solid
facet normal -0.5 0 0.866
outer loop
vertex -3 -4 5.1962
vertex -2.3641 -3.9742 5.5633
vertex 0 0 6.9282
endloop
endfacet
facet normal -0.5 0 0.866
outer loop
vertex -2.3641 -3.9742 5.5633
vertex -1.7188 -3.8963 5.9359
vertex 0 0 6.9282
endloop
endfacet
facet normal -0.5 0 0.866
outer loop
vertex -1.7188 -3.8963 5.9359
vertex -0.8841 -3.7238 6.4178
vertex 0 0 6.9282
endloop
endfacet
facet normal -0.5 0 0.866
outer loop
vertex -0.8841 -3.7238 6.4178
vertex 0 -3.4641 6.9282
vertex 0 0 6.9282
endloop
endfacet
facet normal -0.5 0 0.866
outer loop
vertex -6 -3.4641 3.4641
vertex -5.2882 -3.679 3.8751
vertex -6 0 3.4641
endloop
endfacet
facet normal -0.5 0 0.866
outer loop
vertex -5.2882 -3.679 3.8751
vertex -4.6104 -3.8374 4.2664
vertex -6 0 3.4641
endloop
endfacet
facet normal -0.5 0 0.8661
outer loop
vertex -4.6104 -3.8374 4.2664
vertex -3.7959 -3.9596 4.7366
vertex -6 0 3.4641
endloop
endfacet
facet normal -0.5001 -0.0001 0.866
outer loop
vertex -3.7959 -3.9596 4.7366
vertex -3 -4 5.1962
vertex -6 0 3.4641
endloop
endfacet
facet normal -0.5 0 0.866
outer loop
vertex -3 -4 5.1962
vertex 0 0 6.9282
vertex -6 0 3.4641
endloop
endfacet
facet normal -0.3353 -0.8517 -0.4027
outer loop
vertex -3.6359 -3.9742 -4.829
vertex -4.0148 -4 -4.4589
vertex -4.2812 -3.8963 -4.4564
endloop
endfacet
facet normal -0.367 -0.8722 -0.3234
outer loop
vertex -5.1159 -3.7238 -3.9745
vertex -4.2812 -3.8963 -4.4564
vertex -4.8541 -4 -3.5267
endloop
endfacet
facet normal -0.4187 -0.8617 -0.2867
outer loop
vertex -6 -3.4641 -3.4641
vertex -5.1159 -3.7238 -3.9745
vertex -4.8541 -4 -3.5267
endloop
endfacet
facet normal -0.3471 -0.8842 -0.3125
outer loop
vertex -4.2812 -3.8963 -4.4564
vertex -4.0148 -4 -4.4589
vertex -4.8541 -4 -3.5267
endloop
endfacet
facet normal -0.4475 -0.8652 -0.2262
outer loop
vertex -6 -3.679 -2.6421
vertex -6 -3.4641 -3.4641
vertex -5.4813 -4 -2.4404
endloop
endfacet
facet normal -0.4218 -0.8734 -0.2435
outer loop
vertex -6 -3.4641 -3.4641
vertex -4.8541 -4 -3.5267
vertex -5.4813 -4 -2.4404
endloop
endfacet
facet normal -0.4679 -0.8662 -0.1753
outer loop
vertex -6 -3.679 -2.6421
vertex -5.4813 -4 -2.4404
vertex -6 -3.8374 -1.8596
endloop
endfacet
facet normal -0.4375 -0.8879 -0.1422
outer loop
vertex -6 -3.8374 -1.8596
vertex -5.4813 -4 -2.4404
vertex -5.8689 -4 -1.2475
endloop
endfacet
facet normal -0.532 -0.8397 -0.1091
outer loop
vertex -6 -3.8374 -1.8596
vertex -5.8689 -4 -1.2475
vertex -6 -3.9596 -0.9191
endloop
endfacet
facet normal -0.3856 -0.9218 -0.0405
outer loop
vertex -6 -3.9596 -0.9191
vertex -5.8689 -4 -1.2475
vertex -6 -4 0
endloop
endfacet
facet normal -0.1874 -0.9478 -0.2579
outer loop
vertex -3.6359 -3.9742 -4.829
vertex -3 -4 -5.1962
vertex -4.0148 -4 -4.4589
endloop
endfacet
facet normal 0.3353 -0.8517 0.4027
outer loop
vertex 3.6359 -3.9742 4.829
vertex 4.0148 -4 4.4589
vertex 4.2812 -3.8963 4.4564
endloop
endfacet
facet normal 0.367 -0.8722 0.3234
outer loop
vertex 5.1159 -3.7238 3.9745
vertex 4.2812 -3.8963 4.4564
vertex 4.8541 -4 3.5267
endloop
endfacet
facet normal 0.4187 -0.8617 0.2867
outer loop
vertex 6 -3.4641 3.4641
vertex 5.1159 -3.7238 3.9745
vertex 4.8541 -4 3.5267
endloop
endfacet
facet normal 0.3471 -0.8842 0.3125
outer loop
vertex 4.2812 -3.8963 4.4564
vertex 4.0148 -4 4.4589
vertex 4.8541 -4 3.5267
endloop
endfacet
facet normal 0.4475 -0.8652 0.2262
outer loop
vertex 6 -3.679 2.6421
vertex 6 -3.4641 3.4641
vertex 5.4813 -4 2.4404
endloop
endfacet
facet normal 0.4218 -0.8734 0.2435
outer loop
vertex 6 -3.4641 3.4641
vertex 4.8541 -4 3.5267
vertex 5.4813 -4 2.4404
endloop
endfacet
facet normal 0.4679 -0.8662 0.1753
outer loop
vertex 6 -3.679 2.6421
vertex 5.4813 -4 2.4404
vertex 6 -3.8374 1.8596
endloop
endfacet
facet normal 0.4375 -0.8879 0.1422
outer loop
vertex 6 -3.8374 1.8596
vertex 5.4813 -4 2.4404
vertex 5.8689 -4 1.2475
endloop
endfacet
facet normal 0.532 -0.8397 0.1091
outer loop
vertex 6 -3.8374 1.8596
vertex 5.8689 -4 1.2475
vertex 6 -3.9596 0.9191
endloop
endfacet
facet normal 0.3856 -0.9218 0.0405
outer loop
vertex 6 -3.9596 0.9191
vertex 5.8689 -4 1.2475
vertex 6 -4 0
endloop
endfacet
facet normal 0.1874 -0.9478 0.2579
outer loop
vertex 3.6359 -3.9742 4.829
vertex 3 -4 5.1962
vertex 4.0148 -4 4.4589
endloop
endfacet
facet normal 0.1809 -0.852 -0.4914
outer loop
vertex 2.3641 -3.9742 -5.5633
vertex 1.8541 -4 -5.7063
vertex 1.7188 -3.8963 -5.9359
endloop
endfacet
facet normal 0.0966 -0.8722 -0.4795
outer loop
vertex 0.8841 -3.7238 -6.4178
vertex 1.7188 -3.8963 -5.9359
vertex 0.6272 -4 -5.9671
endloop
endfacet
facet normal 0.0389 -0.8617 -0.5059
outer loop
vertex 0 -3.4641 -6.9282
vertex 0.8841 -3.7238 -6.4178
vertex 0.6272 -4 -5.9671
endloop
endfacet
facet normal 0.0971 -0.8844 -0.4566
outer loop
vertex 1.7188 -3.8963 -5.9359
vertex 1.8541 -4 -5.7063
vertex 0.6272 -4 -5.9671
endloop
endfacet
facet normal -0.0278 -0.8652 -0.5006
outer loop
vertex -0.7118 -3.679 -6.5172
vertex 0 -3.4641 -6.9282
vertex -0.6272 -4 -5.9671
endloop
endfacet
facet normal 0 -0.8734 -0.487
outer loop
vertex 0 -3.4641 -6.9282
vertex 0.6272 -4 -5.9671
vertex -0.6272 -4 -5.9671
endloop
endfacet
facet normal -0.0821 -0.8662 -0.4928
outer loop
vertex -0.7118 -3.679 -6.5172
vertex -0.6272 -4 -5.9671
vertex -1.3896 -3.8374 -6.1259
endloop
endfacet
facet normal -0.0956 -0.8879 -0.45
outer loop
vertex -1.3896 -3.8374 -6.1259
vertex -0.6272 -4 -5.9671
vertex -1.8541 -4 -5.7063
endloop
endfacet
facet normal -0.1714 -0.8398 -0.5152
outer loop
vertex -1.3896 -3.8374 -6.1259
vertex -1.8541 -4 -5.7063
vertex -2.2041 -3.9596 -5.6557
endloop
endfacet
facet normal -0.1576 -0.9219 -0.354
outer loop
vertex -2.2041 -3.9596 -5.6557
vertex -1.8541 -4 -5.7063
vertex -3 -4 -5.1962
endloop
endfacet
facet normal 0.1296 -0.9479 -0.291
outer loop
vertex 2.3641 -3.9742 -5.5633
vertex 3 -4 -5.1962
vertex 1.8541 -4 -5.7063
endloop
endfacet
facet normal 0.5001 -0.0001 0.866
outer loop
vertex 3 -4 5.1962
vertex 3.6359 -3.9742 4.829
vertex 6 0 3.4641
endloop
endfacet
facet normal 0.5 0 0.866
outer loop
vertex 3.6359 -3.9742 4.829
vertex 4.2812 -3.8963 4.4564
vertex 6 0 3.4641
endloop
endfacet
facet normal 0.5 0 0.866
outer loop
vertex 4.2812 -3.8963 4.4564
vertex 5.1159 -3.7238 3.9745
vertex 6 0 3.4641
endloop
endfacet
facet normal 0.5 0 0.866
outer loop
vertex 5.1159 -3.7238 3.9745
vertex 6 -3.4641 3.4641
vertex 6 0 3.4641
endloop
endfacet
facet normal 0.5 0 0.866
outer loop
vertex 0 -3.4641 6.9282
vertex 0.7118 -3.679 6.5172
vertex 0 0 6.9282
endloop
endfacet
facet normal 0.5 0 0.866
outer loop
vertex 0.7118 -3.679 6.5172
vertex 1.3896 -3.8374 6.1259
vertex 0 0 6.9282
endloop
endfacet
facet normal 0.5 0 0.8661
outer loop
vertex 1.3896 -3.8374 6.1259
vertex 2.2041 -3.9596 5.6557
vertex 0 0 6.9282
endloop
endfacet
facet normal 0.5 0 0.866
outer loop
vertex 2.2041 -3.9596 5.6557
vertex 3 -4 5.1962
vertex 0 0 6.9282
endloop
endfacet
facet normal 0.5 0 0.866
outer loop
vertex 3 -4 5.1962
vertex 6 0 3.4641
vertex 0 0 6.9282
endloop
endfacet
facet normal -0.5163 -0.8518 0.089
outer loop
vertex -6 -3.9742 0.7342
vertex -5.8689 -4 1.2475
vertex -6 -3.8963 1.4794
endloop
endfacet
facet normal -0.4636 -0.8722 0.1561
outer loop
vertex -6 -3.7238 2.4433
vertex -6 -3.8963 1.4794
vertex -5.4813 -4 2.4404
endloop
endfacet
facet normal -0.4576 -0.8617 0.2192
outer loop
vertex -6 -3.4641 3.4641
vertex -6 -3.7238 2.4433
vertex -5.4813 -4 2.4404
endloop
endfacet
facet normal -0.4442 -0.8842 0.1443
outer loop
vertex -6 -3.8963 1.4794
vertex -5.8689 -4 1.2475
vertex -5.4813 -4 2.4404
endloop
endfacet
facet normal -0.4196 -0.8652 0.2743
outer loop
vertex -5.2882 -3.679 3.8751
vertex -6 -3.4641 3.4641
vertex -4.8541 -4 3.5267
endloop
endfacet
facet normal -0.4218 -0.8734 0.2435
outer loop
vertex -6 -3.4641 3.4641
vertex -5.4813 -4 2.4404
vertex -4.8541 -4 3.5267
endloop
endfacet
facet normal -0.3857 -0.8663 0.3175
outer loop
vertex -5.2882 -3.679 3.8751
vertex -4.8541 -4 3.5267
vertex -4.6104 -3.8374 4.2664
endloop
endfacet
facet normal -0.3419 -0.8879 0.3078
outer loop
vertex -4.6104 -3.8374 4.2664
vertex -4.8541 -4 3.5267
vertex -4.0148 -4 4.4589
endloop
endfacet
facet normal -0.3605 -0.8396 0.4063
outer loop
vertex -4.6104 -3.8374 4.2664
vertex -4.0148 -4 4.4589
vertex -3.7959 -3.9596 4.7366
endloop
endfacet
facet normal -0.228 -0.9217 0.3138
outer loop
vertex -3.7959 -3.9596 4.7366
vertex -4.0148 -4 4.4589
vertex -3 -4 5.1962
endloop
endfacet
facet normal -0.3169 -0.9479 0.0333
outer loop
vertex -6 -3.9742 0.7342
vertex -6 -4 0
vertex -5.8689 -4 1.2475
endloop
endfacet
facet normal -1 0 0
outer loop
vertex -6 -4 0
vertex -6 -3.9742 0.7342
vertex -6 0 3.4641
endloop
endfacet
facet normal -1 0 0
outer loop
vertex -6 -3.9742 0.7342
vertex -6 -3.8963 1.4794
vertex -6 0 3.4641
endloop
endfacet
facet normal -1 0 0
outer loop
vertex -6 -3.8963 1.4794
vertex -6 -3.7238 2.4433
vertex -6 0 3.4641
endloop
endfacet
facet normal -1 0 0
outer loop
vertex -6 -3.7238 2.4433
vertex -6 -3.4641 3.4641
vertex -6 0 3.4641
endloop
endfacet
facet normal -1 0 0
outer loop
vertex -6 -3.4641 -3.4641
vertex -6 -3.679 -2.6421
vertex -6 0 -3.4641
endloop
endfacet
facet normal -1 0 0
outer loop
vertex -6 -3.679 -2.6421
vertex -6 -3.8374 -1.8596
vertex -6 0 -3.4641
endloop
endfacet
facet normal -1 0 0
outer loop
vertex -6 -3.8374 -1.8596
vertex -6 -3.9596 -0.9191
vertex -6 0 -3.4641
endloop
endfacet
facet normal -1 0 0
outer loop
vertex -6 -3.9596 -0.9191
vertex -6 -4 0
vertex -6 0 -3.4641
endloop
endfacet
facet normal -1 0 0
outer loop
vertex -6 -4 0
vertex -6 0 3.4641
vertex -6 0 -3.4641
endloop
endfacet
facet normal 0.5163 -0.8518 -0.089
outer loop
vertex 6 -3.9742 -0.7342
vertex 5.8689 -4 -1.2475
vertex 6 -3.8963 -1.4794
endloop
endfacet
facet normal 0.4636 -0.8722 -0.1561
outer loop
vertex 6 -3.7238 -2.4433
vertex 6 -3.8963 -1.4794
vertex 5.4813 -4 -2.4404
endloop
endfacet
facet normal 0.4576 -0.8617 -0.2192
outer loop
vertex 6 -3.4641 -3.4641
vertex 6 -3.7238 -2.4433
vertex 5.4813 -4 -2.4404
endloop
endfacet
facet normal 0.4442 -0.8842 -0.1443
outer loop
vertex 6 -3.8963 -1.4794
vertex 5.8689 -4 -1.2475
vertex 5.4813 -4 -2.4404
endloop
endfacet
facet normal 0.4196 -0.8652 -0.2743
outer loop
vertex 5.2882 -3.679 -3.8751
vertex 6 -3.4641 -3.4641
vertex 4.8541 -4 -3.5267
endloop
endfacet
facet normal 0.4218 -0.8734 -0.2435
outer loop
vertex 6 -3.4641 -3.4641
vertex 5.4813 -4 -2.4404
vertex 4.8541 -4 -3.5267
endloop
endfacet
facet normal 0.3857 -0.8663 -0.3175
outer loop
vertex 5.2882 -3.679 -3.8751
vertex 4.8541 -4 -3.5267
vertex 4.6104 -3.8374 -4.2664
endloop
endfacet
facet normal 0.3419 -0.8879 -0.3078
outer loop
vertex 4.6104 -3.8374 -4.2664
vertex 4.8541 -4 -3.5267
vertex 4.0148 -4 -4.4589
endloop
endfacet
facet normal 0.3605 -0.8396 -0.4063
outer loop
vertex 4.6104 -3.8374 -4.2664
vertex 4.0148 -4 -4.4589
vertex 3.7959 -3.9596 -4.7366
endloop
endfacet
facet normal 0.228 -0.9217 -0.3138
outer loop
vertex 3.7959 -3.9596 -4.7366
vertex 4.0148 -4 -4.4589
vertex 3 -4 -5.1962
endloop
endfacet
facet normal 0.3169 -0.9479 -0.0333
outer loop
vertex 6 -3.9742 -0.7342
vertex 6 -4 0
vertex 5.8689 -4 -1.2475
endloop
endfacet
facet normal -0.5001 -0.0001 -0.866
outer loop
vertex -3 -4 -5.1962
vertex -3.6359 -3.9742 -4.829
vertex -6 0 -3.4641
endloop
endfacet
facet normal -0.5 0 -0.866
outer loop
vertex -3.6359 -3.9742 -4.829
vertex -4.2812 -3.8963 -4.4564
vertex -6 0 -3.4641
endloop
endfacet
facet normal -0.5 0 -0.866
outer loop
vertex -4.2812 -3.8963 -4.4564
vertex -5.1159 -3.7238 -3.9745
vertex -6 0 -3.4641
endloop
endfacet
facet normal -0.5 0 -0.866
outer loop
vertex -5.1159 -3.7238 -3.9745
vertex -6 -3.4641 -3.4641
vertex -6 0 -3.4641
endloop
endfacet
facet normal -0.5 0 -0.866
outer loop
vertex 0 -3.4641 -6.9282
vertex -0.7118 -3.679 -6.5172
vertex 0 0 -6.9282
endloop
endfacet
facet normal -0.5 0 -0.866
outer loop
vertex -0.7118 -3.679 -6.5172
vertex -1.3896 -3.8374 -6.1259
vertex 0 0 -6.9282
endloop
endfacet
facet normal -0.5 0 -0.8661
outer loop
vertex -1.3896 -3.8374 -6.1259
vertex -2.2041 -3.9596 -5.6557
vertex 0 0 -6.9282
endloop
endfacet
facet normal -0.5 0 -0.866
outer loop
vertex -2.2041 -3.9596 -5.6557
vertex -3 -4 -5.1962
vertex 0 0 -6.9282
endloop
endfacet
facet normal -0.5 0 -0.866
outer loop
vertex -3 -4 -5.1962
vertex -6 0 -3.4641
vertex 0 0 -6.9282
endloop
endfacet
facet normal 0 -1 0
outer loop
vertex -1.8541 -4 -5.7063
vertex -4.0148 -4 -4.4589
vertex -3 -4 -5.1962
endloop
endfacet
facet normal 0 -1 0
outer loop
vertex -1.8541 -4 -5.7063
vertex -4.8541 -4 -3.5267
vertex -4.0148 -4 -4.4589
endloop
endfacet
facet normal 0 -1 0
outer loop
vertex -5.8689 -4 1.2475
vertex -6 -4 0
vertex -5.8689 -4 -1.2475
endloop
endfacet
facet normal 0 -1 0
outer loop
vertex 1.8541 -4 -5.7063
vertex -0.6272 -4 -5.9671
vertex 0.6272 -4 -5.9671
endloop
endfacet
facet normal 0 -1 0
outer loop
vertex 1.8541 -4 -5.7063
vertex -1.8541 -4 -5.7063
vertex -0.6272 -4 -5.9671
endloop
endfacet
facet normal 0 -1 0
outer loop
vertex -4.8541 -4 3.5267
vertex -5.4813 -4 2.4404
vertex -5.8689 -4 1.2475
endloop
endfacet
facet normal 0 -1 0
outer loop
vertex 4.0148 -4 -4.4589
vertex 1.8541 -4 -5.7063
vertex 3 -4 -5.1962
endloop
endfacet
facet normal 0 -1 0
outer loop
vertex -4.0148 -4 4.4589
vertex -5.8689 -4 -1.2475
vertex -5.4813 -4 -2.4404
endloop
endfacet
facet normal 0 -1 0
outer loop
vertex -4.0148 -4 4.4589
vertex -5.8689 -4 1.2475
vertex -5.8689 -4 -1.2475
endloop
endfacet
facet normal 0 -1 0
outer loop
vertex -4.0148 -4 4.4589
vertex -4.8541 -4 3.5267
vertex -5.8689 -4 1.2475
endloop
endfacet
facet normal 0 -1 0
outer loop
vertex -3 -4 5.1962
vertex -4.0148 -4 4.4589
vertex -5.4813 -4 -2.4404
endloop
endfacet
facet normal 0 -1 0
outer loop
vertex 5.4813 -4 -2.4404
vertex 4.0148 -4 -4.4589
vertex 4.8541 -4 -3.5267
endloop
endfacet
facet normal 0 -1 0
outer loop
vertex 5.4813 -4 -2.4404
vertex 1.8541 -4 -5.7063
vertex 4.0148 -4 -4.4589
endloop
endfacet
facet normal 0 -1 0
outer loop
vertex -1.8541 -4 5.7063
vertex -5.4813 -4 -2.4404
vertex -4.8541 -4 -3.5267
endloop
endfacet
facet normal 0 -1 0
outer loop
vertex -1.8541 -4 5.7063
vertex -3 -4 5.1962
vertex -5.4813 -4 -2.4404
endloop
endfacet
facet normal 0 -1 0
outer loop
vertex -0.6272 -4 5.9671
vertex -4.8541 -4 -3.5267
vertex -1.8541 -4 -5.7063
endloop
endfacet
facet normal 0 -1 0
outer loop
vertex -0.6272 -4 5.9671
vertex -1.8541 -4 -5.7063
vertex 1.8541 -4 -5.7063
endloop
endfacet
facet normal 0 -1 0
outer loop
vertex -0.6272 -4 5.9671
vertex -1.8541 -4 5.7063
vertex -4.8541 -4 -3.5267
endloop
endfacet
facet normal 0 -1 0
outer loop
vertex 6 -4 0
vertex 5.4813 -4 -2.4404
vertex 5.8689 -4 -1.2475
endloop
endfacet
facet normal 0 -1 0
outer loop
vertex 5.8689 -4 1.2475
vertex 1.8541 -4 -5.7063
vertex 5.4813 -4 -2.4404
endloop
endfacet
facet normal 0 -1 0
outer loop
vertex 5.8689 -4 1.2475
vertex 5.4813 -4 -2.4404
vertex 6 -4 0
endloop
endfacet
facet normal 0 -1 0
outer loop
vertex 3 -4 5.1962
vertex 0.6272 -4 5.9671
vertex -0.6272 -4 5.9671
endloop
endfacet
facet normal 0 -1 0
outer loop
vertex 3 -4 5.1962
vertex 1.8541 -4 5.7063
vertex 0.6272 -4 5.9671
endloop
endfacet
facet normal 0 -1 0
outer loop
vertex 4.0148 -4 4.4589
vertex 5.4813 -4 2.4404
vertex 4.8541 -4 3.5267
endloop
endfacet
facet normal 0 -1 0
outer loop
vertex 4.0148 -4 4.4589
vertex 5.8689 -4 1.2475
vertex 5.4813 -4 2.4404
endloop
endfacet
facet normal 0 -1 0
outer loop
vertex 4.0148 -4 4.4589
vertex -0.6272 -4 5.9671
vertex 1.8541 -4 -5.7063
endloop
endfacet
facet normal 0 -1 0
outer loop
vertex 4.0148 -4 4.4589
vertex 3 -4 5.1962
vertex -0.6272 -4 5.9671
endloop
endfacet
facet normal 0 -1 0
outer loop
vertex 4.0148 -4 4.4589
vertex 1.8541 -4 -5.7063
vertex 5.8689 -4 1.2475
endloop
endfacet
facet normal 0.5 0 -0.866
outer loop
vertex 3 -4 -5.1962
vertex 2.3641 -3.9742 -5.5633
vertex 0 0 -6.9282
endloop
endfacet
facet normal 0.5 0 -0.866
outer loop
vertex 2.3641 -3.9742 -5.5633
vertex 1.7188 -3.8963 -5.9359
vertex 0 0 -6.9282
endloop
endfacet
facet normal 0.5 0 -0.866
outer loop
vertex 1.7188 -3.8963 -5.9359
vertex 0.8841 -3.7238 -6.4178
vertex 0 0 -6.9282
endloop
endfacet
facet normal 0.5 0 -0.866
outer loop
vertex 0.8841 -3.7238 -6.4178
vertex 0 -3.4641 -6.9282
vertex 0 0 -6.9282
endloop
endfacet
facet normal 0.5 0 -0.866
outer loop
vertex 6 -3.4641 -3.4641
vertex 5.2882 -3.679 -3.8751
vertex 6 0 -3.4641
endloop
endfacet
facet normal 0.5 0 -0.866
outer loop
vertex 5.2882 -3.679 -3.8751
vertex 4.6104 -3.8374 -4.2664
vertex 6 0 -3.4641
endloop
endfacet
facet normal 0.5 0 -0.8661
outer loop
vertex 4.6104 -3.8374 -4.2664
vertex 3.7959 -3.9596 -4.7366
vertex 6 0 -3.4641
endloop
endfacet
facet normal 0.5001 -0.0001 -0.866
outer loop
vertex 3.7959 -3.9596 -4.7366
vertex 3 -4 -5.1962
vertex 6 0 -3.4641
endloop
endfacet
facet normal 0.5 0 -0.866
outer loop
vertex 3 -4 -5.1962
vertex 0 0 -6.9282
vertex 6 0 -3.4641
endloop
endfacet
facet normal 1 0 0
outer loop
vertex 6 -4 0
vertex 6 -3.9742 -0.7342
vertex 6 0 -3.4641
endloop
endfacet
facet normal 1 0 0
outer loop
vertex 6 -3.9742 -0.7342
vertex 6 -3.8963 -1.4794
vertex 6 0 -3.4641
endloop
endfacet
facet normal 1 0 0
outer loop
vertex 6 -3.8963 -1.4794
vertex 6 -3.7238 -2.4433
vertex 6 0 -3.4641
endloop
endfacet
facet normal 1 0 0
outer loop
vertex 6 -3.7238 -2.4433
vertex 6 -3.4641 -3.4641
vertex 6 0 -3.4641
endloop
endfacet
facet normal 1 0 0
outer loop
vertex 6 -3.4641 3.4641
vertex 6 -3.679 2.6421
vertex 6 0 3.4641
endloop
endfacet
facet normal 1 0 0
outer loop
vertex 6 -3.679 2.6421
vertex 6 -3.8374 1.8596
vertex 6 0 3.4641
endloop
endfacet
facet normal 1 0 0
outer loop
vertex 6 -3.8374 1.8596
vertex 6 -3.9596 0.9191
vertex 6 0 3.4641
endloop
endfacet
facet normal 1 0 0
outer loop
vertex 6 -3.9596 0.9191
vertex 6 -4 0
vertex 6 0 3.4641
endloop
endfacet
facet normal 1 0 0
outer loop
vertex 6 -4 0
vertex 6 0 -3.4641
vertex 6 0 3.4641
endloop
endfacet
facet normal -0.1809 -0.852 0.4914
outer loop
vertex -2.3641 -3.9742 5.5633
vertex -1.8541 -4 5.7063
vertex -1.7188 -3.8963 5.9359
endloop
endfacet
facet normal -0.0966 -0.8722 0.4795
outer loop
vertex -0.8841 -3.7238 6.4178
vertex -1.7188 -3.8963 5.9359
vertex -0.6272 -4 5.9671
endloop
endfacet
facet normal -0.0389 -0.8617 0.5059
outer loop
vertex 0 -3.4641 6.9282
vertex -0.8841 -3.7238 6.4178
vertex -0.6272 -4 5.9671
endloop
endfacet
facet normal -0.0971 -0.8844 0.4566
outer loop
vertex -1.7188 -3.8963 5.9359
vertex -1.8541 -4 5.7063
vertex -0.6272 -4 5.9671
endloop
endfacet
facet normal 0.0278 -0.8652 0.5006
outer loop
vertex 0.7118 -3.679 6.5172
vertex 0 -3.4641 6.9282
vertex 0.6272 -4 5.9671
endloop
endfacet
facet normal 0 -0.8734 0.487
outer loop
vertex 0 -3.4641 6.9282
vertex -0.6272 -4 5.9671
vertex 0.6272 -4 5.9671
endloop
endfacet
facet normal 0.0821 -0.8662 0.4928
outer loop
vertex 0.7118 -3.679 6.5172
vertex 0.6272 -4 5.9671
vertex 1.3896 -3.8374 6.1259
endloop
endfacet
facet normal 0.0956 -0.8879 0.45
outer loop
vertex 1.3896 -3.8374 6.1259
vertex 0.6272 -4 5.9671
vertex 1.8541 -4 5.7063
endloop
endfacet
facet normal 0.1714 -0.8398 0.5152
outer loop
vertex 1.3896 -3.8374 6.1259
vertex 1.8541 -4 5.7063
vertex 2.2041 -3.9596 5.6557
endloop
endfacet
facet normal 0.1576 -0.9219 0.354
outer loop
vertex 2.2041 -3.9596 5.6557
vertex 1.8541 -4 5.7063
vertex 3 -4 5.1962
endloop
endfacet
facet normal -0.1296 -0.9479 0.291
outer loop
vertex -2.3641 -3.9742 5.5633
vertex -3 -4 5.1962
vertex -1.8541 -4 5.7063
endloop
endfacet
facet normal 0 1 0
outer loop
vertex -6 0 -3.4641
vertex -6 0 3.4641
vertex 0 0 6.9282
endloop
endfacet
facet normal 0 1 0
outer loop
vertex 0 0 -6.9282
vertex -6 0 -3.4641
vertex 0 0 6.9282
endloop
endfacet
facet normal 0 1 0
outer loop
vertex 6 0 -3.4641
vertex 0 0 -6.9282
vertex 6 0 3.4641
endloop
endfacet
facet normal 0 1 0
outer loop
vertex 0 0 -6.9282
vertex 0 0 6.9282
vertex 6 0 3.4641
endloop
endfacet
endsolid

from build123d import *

# Parameters (mm, degrees)
F1_DEPTH = 4


with BuildPart() as f1:
    # F0 (on Front) → F1 (new body)
    with BuildSketch(Plane.XZ):
        Polygon((0, 6.928203), (-6, 3.464102), (-6, -3.464102), (0, -6.928203), (6, -3.464102), (6, 3.464102), align=None)
    extrude(amount=F1_DEPTH)

    # F2 (on Top) → F3 (revolve, cut)
    with BuildSketch(Plane.XY):
        Polygon((15.133317, 1.273123), (6, -4), (15.133317, -4), align=None)
    revolve(axis=Axis((0, -1.59565, 0), (0, 1, 0)), mode=Mode.SUBTRACT)


solid = f1.part
